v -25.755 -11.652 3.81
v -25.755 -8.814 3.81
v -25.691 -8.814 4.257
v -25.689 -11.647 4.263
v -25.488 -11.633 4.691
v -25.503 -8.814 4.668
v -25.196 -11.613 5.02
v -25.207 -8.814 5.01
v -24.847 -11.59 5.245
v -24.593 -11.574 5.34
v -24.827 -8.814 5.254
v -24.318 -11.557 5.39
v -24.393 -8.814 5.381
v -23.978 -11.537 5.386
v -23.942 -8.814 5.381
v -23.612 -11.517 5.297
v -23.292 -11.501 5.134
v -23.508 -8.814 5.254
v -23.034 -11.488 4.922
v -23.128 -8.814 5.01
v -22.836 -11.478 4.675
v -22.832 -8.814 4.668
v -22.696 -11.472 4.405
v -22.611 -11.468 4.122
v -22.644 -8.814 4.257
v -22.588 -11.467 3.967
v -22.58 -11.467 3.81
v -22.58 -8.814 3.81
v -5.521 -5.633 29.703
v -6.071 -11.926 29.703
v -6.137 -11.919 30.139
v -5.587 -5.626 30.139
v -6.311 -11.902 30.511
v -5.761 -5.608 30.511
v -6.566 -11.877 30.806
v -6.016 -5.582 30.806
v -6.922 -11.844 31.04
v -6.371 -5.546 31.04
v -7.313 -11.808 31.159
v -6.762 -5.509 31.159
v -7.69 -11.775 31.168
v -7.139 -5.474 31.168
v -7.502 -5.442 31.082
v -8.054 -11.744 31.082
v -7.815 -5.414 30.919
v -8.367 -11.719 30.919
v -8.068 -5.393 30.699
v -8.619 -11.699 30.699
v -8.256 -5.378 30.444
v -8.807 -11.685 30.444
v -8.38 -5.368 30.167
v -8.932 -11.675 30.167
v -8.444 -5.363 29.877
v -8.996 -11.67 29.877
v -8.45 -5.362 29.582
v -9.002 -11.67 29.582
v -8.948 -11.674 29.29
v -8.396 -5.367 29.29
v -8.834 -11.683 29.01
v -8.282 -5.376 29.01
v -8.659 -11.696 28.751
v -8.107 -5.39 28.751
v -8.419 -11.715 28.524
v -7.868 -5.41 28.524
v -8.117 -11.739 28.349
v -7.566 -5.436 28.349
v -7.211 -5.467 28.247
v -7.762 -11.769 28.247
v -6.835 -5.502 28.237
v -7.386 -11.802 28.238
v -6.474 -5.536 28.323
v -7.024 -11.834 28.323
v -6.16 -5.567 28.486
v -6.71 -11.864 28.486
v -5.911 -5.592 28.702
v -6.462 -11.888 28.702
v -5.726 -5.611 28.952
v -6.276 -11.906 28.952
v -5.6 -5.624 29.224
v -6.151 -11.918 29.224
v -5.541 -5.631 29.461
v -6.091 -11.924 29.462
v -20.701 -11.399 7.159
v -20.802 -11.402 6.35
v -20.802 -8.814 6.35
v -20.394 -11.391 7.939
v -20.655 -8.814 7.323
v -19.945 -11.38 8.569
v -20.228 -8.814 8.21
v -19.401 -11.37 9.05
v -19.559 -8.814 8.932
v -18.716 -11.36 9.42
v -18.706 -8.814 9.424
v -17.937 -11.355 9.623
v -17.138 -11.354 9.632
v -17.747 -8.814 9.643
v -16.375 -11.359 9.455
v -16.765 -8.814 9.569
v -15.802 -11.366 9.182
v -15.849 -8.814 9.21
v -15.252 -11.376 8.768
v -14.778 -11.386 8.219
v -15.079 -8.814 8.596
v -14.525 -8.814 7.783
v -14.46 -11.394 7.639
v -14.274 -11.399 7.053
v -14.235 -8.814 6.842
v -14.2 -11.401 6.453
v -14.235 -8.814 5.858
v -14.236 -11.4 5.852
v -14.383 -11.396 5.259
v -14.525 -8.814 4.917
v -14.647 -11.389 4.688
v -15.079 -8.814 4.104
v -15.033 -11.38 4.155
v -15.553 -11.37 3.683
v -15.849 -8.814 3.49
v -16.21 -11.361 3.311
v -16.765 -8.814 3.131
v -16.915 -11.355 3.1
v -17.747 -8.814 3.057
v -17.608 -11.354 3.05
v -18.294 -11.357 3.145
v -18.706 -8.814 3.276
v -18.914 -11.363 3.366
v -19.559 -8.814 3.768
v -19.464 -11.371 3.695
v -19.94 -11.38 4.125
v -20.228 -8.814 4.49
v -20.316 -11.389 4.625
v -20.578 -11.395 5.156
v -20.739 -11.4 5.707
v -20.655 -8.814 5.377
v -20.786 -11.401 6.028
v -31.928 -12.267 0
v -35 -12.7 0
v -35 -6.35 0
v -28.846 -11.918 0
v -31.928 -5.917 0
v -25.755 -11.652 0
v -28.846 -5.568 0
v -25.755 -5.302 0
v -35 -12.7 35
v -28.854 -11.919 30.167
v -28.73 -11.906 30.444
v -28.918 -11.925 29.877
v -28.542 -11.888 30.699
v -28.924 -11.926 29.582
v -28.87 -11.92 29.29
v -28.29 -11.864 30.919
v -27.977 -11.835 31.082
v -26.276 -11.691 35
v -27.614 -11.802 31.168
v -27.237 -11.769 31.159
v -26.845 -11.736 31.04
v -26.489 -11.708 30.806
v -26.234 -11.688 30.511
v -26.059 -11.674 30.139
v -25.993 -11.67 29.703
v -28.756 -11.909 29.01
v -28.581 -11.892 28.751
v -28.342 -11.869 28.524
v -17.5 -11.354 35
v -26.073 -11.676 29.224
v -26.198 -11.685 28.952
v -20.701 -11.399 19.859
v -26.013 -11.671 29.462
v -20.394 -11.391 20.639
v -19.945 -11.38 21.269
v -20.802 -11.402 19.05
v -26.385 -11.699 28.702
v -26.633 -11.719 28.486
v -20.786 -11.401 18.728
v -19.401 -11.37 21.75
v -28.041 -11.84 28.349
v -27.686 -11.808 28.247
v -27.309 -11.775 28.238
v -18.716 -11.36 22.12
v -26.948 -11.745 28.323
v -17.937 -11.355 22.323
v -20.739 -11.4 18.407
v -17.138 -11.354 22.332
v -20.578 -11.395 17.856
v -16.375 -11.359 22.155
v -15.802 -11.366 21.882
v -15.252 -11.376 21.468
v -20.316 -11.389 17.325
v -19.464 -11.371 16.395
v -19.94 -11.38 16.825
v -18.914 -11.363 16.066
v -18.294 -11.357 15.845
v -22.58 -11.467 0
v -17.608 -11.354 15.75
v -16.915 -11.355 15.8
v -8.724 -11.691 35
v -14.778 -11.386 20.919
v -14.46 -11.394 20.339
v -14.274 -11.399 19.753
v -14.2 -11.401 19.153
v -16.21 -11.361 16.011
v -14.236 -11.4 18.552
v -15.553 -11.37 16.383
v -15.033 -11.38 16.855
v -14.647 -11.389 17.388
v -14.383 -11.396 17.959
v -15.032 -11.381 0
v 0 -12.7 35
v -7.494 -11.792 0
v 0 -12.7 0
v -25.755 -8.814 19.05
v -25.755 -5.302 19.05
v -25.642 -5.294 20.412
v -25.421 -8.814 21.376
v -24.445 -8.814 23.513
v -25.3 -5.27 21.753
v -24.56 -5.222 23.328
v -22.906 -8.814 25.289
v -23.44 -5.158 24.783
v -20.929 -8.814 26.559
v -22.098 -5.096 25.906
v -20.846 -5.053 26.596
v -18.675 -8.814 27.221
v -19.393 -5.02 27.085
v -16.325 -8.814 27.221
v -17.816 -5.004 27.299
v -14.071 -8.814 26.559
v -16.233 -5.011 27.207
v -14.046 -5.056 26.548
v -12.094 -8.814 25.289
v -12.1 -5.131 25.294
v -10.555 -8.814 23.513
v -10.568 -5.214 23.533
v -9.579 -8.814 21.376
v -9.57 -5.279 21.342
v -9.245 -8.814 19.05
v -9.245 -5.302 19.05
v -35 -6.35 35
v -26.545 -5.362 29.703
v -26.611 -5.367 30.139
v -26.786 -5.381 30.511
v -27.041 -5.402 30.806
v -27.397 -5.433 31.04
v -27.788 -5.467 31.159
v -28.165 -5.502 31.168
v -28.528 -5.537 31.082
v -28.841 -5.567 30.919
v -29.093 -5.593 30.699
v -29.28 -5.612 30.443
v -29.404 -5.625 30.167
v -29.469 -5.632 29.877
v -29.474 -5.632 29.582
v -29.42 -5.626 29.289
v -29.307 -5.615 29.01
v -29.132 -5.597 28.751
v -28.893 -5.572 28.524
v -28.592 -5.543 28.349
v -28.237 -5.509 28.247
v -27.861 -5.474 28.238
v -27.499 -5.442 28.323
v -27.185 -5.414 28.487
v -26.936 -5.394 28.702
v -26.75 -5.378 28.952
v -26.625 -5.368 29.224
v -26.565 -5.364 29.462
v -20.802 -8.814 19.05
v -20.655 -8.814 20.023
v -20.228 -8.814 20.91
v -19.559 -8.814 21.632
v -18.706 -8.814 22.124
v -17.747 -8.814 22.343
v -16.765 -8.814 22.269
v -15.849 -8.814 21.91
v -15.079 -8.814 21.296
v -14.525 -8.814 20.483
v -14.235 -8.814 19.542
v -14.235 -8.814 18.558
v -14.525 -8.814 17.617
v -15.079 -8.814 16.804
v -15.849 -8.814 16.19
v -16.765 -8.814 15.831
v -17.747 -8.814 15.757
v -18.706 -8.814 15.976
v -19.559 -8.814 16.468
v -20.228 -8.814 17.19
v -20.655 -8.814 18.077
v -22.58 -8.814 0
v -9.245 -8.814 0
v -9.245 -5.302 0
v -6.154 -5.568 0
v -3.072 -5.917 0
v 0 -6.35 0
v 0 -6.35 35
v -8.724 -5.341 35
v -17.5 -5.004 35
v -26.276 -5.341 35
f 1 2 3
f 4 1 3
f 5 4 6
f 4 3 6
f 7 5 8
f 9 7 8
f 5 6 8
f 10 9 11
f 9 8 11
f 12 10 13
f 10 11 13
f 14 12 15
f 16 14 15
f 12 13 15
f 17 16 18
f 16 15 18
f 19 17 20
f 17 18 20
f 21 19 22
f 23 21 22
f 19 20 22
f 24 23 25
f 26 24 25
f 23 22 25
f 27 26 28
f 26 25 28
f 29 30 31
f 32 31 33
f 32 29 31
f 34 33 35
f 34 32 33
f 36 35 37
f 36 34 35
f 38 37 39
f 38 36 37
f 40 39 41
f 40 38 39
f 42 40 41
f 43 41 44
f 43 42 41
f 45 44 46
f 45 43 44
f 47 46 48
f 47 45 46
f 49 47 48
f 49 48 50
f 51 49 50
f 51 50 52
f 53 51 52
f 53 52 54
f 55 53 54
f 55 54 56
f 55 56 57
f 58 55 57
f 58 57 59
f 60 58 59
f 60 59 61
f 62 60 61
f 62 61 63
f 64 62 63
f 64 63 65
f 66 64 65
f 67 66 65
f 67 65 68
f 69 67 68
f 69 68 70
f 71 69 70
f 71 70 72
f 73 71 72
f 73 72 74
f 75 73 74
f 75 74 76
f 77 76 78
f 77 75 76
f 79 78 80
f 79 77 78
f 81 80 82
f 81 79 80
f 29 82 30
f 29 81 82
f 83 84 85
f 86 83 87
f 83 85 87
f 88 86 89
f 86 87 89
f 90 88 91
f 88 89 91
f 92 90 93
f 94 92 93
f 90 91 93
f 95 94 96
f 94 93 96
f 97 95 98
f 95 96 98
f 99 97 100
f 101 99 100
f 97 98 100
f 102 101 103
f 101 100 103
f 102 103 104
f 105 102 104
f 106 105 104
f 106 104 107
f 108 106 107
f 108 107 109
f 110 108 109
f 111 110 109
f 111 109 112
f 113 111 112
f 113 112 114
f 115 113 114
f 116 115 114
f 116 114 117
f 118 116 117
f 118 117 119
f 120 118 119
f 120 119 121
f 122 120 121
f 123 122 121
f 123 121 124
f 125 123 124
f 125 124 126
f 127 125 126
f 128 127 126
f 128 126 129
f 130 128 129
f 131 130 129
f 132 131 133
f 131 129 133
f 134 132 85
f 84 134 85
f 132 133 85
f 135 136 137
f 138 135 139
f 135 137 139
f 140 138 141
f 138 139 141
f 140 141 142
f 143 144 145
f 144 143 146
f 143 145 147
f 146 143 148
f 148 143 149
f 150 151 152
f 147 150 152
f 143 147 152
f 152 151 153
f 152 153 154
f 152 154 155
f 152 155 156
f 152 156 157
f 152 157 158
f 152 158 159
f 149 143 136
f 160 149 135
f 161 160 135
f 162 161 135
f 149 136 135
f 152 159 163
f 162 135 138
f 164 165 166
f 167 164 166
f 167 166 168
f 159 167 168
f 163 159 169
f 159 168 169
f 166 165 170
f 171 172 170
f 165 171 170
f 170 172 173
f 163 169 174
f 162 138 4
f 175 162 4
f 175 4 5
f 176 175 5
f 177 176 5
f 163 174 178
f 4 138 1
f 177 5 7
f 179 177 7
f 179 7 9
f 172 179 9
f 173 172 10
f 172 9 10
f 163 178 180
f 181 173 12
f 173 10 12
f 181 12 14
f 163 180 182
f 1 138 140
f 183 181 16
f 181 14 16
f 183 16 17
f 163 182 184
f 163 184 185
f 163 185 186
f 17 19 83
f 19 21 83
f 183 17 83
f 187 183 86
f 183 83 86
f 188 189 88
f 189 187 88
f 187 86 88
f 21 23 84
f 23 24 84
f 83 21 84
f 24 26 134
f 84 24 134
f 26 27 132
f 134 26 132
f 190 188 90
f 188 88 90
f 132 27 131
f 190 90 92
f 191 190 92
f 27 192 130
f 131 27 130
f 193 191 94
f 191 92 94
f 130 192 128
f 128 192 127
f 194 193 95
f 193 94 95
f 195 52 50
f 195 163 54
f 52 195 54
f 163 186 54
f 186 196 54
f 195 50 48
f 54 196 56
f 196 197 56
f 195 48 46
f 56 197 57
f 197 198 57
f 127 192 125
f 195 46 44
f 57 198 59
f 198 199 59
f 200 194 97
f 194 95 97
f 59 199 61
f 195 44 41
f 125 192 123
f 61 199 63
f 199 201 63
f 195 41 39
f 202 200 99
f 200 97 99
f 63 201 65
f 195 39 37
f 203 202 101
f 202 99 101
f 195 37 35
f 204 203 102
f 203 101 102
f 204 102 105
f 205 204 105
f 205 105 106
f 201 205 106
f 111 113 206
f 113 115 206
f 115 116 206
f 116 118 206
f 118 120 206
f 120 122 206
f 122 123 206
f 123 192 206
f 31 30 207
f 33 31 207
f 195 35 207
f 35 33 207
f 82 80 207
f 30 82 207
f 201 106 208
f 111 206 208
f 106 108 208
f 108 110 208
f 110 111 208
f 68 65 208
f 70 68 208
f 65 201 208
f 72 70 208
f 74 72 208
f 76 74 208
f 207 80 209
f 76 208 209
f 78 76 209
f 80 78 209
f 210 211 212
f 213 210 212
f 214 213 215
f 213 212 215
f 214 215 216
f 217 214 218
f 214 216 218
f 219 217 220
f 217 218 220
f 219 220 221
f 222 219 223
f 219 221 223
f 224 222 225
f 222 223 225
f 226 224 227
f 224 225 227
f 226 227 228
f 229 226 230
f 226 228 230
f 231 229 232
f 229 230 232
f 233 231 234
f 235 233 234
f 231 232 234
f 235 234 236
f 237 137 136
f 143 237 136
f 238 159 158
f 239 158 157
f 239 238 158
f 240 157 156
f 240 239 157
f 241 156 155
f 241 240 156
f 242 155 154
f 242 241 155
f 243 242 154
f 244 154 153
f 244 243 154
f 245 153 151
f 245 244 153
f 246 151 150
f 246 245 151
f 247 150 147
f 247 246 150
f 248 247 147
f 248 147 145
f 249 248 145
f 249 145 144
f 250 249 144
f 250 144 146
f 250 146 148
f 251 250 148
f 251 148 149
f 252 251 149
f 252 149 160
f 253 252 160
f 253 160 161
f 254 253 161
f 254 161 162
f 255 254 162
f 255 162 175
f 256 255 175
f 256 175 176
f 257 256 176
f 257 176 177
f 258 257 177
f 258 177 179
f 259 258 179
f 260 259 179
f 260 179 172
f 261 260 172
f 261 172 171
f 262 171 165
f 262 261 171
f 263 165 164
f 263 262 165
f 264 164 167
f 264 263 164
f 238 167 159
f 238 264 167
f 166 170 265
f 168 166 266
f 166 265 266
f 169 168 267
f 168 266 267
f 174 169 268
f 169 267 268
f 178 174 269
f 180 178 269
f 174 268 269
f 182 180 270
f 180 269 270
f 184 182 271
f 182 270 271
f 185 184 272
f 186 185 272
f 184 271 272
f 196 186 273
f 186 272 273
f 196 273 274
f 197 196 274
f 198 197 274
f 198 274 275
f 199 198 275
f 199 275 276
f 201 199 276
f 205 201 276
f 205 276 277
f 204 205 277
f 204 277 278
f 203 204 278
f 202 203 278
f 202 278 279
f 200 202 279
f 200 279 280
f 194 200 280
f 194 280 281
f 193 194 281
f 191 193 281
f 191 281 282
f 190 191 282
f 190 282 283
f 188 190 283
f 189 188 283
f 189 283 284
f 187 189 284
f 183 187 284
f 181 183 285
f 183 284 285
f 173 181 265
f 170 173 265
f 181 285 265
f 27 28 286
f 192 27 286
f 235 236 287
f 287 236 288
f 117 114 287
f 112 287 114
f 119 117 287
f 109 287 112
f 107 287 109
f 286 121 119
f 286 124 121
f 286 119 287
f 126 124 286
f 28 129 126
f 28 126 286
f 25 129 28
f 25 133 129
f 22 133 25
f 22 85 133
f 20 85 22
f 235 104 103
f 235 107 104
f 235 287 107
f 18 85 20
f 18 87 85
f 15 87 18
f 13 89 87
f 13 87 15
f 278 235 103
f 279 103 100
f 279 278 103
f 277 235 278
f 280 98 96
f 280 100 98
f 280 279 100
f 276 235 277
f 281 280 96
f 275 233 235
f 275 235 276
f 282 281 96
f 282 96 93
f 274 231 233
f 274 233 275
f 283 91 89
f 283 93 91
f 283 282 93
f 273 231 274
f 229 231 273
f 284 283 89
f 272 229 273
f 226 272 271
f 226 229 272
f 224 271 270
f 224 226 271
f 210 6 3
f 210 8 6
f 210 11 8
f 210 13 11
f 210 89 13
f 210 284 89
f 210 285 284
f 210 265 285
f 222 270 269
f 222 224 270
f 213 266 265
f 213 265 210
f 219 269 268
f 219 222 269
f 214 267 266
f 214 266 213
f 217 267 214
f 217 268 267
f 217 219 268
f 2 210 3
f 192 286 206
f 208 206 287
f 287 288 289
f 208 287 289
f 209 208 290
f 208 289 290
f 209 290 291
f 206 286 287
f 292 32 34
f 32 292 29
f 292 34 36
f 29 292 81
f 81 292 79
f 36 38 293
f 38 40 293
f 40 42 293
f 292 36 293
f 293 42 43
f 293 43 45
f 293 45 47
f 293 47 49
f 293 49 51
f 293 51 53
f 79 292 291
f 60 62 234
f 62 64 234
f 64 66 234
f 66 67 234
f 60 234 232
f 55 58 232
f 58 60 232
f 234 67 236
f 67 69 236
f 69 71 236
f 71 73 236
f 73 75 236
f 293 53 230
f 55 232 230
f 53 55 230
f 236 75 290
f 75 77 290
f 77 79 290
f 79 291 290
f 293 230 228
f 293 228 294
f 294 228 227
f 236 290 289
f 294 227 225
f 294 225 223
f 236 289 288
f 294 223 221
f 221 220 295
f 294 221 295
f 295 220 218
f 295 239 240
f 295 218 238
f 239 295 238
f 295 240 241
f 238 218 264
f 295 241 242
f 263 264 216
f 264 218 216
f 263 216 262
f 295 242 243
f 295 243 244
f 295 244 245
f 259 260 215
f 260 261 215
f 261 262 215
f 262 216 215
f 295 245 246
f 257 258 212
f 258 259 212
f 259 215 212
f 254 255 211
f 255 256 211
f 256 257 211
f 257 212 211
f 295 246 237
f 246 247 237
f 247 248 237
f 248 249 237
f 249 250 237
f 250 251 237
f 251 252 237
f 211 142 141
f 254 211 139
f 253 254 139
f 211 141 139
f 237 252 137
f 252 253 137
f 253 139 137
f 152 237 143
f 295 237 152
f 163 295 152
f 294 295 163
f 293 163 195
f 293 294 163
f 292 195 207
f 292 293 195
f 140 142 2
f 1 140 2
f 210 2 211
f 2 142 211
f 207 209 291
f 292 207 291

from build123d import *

# Parameters (mm, degrees)
BOSS_EXTRUDE1_DEPTH     = 35
CUT_EXTRUDE4_DEPTH      = 51.280392475
CUT_EXTRUDE4_DEPTH_BACK = 51.280392475
SKETCH6_R               = 1.4732
CUT_EXTRUDE5_DEPTH      = 51.935908437
CUT_EXTRUDE5_DEPTH_BACK = 51.935908437
SKETCH7_R               = 1.4732
CUT_EXTRUDE6_DEPTH      = 52.100782935
SKETCH10_R              = 3.302
CUT_EXTRUDE7_DEPTH      = 40.880823427
SKETCH10_3_R            = 3.302
CUT_EXTRUDE8_DEPTH      = 3.81
CUT_EXTRUDE9_DEPTH      = 50.649791979


with BuildPart() as part:
    # Sketch1 → Boss-Extrude1 (new body)
    with BuildSketch(Plane.XY):
        with BuildLine():
            Line((0, -12.7), (0, 0))
            Line((0, 0), (-35, 0))
            Line((-35, 0), (-35, -12.7))
            ThreePointArc((-35, -12.7), (-17.5, -11.353892856), (0, -12.7))
        make_face()
    extrude(amount=BOSS_EXTRUDE1_DEPTH)

    # Sketch6 → Cut-Extrude4 (cut, two sides: drawn at the far end of the back side and taken through both)
    with BuildSketch(Plane(origin=(-1.080773401, -12.353296496, 0), x_dir=(0.9961946980917455, -0.08715574274765824, 0), z_dir=(-0.08715574274765824, -0.9961946980917455, 0)).offset(-CUT_EXTRUDE4_DEPTH_BACK)):
        with Locations((-6.482080767, 29.70276)):
            Circle(SKETCH6_R)
    extrude(amount=CUT_EXTRUDE4_DEPTH + CUT_EXTRUDE4_DEPTH_BACK, mode=Mode.SUBTRACT)

    # Sketch7 → Cut-Extrude5 (cut, two sides: drawn at the far end of the back side and taken through both)
    with BuildSketch(Plane(origin=(0.814909078, -9.314453387, 0), x_dir=(0.9961946980917455, 0.08715574274765851, 0), z_dir=(0.08715574274765851, -0.9961946980917455, 0)).offset(-CUT_EXTRUDE5_DEPTH_BACK)):
        with Locations((-28.384733667, 29.70276)):
            Circle(SKETCH7_R)
    extrude(amount=CUT_EXTRUDE5_DEPTH + CUT_EXTRUDE5_DEPTH_BACK, mode=Mode.SUBTRACT)

    # Sketch8 → Cut-Extrude6 (cut, through all)
    with BuildSketch(Plane(origin=(0, 0, 0), x_dir=(-1, 0, 0), z_dir=(0, 0, -1))):
        with BuildLine():
            ThreePointArc((0, -6.35), (17.5, -5.003892856), (35, -6.35))
            Line((35, -6.35), (35, 0))
            Line((35, 0), (0, 0))
            Line((0, 0), (0, -6.35))
        make_face()
    extrude(amount=-CUT_EXTRUDE6_DEPTH, mode=Mode.SUBTRACT)

    # Sketch10 → Cut-Extrude7 (cut, through all)
    with BuildSketch(Plane(origin=(-17.5, -5.003892856, 0), x_dir=(-1, 0, 0), z_dir=(0, 1, 0))):
        with Locations((0, 19.05)):
            Circle(SKETCH10_R)
        with Locations((0, 6.35)):
            Circle(SKETCH10_R)
    extrude(amount=-CUT_EXTRUDE7_DEPTH, mode=Mode.SUBTRACT)

    # Sketch10<3> → Cut-Extrude8 (cut)
    with BuildSketch(Plane(origin=(-17.5, -5.003892856, 0), x_dir=(-1, 0, 0), z_dir=(0, 1, 0))):
        with BuildLine():
            Line((-8.255, 19.05), (-8.255, -2.465000046))
            Line((-8.255, -2.465000046), (8.255, -2.465000046))
            Line((8.255, -2.465000046), (8.255, 19.05))
            ThreePointArc((8.255, 19.05), (0, 27.305), (-8.255, 19.05))
        make_face()
        with Locations((0, 6.35)):
            Circle(SKETCH10_3_R, mode=Mode.SUBTRACT)
        with Locations((0, 19.05)):
            Circle(SKETCH10_3_R, mode=Mode.SUBTRACT)
    extrude(amount=-CUT_EXTRUDE8_DEPTH, mode=Mode.SUBTRACT)

    # Sketch11 → Cut-Extrude9 (cut, through all)
    with BuildSketch(Plane(origin=(0, -8.813892856, 0), x_dir=(1, 0, 0), z_dir=(0, 1, 0))):
        with BuildLine():
            Line((-22.58, -3.81), (-22.58, 0))
            Line((-22.58, 0), (-25.755, 0))
            Line((-25.755, 0), (-25.755, -3.81))
            ThreePointArc((-25.755, -3.81), (-24.1675, -5.3975), (-22.58, -3.81))
        make_face()
    extrude(amount=-CUT_EXTRUDE9_DEPTH, mode=Mode.SUBTRACT)


solid = part.part
